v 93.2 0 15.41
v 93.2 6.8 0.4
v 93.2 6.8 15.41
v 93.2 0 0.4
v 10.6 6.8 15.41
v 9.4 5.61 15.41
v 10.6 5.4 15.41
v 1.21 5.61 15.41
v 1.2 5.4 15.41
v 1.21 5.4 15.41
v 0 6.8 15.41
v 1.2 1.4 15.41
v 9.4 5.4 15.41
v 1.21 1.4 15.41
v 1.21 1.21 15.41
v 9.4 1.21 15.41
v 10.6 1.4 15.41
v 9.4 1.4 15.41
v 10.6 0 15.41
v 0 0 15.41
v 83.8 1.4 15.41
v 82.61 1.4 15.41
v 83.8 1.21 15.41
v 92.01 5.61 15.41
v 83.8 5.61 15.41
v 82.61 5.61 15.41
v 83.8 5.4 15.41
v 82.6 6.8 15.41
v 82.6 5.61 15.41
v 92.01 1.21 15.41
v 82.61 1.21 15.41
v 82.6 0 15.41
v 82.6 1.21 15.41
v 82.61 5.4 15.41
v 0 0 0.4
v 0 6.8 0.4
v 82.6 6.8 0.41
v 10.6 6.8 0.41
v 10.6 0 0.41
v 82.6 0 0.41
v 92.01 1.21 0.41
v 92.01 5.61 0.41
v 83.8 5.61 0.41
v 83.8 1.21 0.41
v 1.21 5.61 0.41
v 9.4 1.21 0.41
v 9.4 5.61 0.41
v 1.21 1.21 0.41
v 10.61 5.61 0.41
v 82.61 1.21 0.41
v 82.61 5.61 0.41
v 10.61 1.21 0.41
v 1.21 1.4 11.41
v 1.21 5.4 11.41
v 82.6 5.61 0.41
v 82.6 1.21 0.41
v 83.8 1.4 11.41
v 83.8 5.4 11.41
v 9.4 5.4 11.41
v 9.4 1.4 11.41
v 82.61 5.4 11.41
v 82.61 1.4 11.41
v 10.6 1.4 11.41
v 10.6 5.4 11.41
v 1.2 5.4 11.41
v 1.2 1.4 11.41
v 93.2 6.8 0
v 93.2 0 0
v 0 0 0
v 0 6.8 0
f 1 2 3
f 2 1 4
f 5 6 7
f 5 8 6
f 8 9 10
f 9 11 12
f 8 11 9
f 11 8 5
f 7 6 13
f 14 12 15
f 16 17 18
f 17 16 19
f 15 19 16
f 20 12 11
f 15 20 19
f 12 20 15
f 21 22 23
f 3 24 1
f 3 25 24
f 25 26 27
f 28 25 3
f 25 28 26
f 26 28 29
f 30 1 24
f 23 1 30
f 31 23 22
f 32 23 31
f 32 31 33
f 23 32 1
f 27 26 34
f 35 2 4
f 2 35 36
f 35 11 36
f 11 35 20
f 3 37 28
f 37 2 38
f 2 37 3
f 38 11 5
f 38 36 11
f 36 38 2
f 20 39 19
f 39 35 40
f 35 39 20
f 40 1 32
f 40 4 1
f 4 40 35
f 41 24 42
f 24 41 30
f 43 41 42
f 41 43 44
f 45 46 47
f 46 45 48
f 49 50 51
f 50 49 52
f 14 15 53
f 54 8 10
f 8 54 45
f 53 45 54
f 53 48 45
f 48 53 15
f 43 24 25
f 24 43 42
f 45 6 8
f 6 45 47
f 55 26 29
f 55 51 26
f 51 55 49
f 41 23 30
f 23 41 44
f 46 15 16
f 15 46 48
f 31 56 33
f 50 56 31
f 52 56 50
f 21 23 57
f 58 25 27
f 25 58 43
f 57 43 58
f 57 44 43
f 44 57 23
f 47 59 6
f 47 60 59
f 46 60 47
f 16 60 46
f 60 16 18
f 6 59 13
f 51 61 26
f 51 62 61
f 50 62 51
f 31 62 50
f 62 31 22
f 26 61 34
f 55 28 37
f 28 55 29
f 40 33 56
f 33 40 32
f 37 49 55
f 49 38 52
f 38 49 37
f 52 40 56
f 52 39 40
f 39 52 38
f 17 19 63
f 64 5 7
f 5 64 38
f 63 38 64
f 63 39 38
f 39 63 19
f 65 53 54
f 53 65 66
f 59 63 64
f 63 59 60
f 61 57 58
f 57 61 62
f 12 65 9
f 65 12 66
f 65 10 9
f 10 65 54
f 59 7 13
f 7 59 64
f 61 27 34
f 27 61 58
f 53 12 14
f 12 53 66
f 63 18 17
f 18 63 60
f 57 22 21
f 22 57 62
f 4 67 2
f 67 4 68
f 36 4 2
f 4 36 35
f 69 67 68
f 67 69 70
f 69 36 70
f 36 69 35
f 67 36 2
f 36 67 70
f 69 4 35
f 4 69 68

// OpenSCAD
// file: ../../Base/Rotation.scad
// Fischertechnik Box Foundation
// Geometry Helpers Rotation

include <PlacementOptions.scad>

// getRotatedSpace(space, rotation=NoRotation)
// Rotates the space dependent on the specified rotation

function getRotatedSpace(space, rotation=NoRotation) = [
    (rotation == Rotate90 || rotation == Rotate270) ? space.y : space.x,
    (rotation == Rotate90 || rotation == Rotate270) ? space.x : space.y
];

// Rotates the given space around the fixed left lower corner
// space = the space the children needs as width/depth list [width,depth]
// rotation = 0 Rotate0 degrees, 1 Rotate90 degrees, 2 Rotate180 degrees, 3 Rotate270 degrees (equivalent to -90)

module RotateFix(space, rotation=NoRotation) {
    dy = (rotation == Rotate0 || rotation == Rotate270) ? 0 :
        (rotation == Rotate90) ? space.x :
        space.y;
    dx = (rotation < Rotate180) ? 0 :
        (rotation == Rotate180) ? space.x :
        space.y;
    
    translate([dx, dy, 0])
        rotate([0, 0, rotations[rotation]])
            children();
}
// file: ../../Base/Alignment.scad
// Fischertechnik Box Foundation
// Geometry Helpers Alignment

include <PlacementOptions.scad>

// getAlignedX(elementWidth, spaceWidth, align=AlignRight, offset=0)
// Gets the aligned X offset of an element with the given
// width in the given space.
// elementWidth = The width of the element to positon
// spaceWidth = The space where the element should be aligned
// align = 0 AlignLeft, 1 AlignCenter, 2 AlignRight
// offset = an optional offset from the aligned position. When
// aligned left or centered, then positive values are in X direction.
// When aligned right then positive values are in negative X direction.

function getAlignedX(elementWidth, spaceWidth, align=AlignRight, offset=0) =
    (align == AlignLeft) ?
        offset :
        ((align == AlignCenter) ?
        (spaceWidth - elementWidth)/2 + offset :
        spaceWidth - offset - elementWidth);

// getAlignedY(elementDepth, spaceDepth, align=AlignTop, offset=0)
// Gets the aligned Y offset of an element with the given
// depth in the given space.
// elementDepth = The depth of the element to positon
// spaceDepth = The space where the element should be aligned
// align = 0 AlignBottom, 1 AlignCenter, 2 AlignTop
// offset = an optional offset from the aligned position. When
// aligned bottom or centered, then positive values are in Y direction.
// When aligned top then positive values are in negative Y direction.

function getAlignedY(elementDepth, spaceDepth, align=AlignTop, offset=0) =
    (align == AlignBottom) ?
        offset :
        ((align == AlignCenter) ?
        (spaceDepth - elementDepth)/2 + offset :
        spaceDepth - offset - elementDepth);
// file: ../../Base/Boxes.scad
// Fischertechnik Box Foundation
// Pre-designed Boxes

use <Constants.scad>

include <PlacementOptions.scad>

box190Width = 190;
box190Depth = 130;
box130Width = 130;
box130Depth = 95;

// Values are from an original ec3 box
topBottomDifference = 1.5;
outerHeight = 40;
innerHeight = 38.2;
baseThickness = outerHeight - innerHeight;
stackExcess = 5.7;
radius = 3.5;
wallThickness = 1.5;
tolerance = 0.2;
stackOffset = innerHeight - stackExcess;

boxUsageHeight = stackOffset;
boxWallThickness = wallThickness;
boxBaseThickness = baseThickness;
boxWebWidth = 3.0;

// getBoxWallThickness()
// Gets the wall thickness of a Fischertechnik Box
function getBoxWallThickness() = boxWallThickness;

// getBoxUsageHeight()
// Gets the usable height of a Fischertechnik box
function getBoxUsageHeight() = boxUsageHeight;

// getBoxInnerHeight()
// Gets the inner height of a Fischertechnik box, including the stack excess
function getBoxInnerHeight() = innerHeight;

// getBoxBaseThickness()
// Gets the thickness of the Fischertechnik box base.
function getBoxBaseThickness() = boxBaseThickness;

// getBoxWebWidth()
// Gets the width of a box web
function getBoxWebWidth() = boxWebWidth;

// getBox190Space()
// Gets the usable inner space of a Box 190 as an x/y-list
function getBox190Space() = [
    box190Width - 2*getBoxWallThickness() - topBottomDifference, 
    box190Depth - 2*getBoxWallThickness() - topBottomDifference ];

// BoxBase(width, depth)
// Creates an empty stackable Fischertechnik compatible box
// width = Outer width of the box (190, 130, ...)
// depth = Outer depth of the box (130, 95, ...)

module BoxBase(width, depth, height=outerHeight) {    
    thinPlate = 0.01;

    innerHeight = height - baseThickness;    
    
    module BodyPlate(width, depth) {
        translate([radius, radius])
        hull() {
            w = width-2*radius;
            d = depth-2*radius;
            cube([w, d, thinPlate]);
            cylinder(thinPlate, r=radius, $fn=getFragments());
            translate([w, 0])
                cylinder(thinPlate, r=radius, $fn=getFragments());
            translate([w, d])
                cylinder(thinPlate, r=radius, $fn=getFragments());
            translate([0, d])
                cylinder(thinPlate, r=radius, $fn=getFragments());
        }
    }
    
    module Body(tolerance=tolerance) {
        hull() {
            // Bottom with tolerance to fit into the original boxes when stacked
            translate([-wallThickness+tolerance, -wallThickness+tolerance, -baseThickness])
                BodyPlate(width-topBottomDifference-2*tolerance, depth-topBottomDifference-2*tolerance);
            
            // Top
            translate([-wallThickness-topBottomDifference/2, -wallThickness-topBottomDifference/2, innerHeight-thinPlate])
                BodyPlate(width, depth);
         }
    }

    module Cutoff() {
        hull() {
            coWidth = width - 2*wallThickness;
            coDepth = depth - 2*wallThickness;
            
            // Bottom
            BodyPlate(coWidth-topBottomDifference, coDepth-topBottomDifference);

            // Top
            translate([-topBottomDifference/2, -topBottomDifference/2, innerHeight+thinPlate]) 
                BodyPlate(coWidth, coDepth);
        }
    }
    
    difference() {        
        Body();
        Cutoff();
        stackOffset = innerHeight - stackExcess;
        translate([0, 0, stackOffset + baseThickness])
            Body(tolerance=0);
    }
}

// Creates the Fischertechnik empty box 130x190 mm and places it at position 0,0
// 190x130 are the outer sizes, the inner space is slightly smaller. Use getBox190Space() to get the inner sizes.
// The box is positioned that the usable inner space is at the 0,0,0 position. The

module Box190() {
    BoxBase(box190Width, box190Depth);
}

// Gets the usable inner space of a Box 130 as an x/y-list
function getBox130Space() = [
    box130Width - 2*getBoxWallThickness() - topBottomDifference, 
    box130Depth - 2*getBoxWallThickness() - topBottomDifference ];

// Creates the Fischertechnik empty box 95x130 mm and places it at position 0,0
// 190x130 are the outer sizes, the inner space is slightly smaller. Use getBox190Space() to get the inner sizes.
// The box is positioned that the usable inner space is at the 0,0,0 position. The

module Box130() {
    BoxBase(box130Width, box130Depth);
}

// Creates a web at the specified box walls
// corner 0 = LowerLeft, 1 = UpperLeft, 2 = UpperRight, 3 = LowerRight
// side 0 = LeftOfCorner, 1 = RightOfCorner
// distance = Distance in mm from the corner
// boxSpace = inner width and depth of the box (default: Box 190)
// webWidth = length of the web (default is 3 mms)
// webThickness = thickness of the web (default is 1 mm)

module BoxWeb(corner, side, distance, boxSpace=getBox190Space(), webWidth=getBoxWebWidth(), webThickness=1.0) {
    sink = getBoxWallThickness()/2;

    width = (corner % 2 == 0) ? 
            (side == LeftOfCorner ? webWidth : webThickness) :
            (side == LeftOfCorner ? webThickness : webWidth);

    depth = (corner % 2 == 0) ? 
            (side == RightOfCorner ? webWidth : webThickness) :
            (side == RightOfCorner ? webThickness : webWidth);
    
    xDiff = corner == LowerLeft ? 
                (side == LeftOfCorner ? -sink : distance) :
            (corner == UpperLeft ?                
                (side == LeftOfCorner ? distance : -sink) :
            (corner == UpperRight ?
                (side == LeftOfCorner ? boxSpace.x-webWidth+sink : boxSpace.x-distance-webThickness) :
                (side == LeftOfCorner ? boxSpace.x-distance-webThickness: boxSpace.x-webWidth+sink)));

    yDiff = corner == LowerLeft ? 
                (side == RightOfCorner ? -sink : distance) :
            (corner == UpperLeft ?
                (side == RightOfCorner ? boxSpace.y-distance : boxSpace.y-webWidth+sink) :
            (corner == UpperRight ?
                (side == RightOfCorner ? boxSpace.y-webWidth+sink : boxSpace.y-distance) :
                (side == RightOfCorner ? distance : -sink)));
    
    translate([xDiff, yDiff, -getExcess()])
        cube([width, depth, boxUsageHeight + 2*getExcess()]);
}
// file: ../../Base/PlacementOptions.scad
// Fischertechnik Box Foundation
// Placement Options

// Alignment
NoAlign = 0;
AlignLeft = 1;
AlignBottom = 2;
AlignCenter = 3;
AlignRight = 4;
AlignTop = 5;

// Element rotation degree steps
rotations = [0, -90, -180, -270];

// Rotation
NoRotation = 0;
Rotate0 = 0;
Rotate90 = 1;
Rotate180 = 2;
Rotate270 = 3;

// Docking (seen from above)
NoDock = -1;
DockLeft = 0;
DockTop = 1;
DockRight = 2;
DockCorner = 2;
DockBottom = 3;

// Web corners
LowerLeft = 0;
UpperLeft = 1;
UpperRight = 2;
LowerRight = 3;

// Web position relative to corner
LeftOfCorner = 0;
RightOfCorner = 1;
// file: ../../Base/Placement.scad
// Fischertechnik Box Foundation
// Geometry Helpers Placement

use <Constants.scad>
use <Alignment.scad>
use <Rotation.scad>
use <Boxes.scad>

include <PlacementOptions.scad>

// Place(x=0, y=0, elementSpace=[0,0], alignX=AlignLeft, alignY=AlignBottom, rotation=Rotate0, boxSpace=getBox190Space())
// Places the child at the specified position
// y = Y-Position. This is a relative position when an X aligment is specified.
// x = X-Position. This is a relative position when an Y aligment is specified.
// elementSpace = space of the element to be placed [x,y]
// alignX = -1=NoAlign, 0 AlignLeft, 1 AlignCenter, 3 AlignRight (elementSpace and boxSpace required!)
// alignY = -1=NoAlign, 2 AlignBottom, 1 AlignCenter, 4 AlignTop (elementSpace and boxSpace required!)
// rotation = 0 Rotate0 0 degrees, 1 Rotate90 90 degrees, 
// 2 Rotate180 180 degrees, 3 Rotate270 270 degrees (equivalent to -90)
// boxSpace = Inner space of the box where the placement occurs [x,y] - default is Box 190x130 inner space

module Place(x=0, y=0, elementSpace=[0,0], 
  alignX=AlignLeft, alignY=AlignBottom, 
  rotation=NoRotation, boxSpace=getBox190Space()) {

    module Position(x, y, space, rotation=Rotate0) {
        translate([x, y, 0])
            RotateFix(space, rotation)
                children();
    }

    space = getRotatedSpace(elementSpace, rotation);
    alignedX = getAlignedX(space.x, boxSpace.x, alignX, x);
    alignedY = getAlignedY(space.y, boxSpace.y, alignY, y);
    Position(alignedX, alignedY, elementSpace, rotation)
        children();
}

// Center(space=getBox130Space(), elementSpace=[0,0])
// space = Space where the children is centered. For cylinder use centered=true and no elementSpace.
// elementSpace = space of the element to be centered [x,y]

module Center(space=getBox190Space(), elementSpace=[0,0]) {
    Place(elementSpace=elementSpace, boxSpace=space, alignX=AlignCenter, alignY=AlignCenter)
        children();
}

// CenterHorizontal(width=0, y=0, offset=0, space=getBox130Space())
// width = Width of the element to be placed.
// y = Y position of the element
// offset = Offset from the center position (negative will be left of the center)
// space = Space where the element is placed

module CenterHorizontal(width=0, y=0, offset=0, space=getBox190Space()) {
    Place(x=offset, y=y, elementSpace=[width, 0], boxSpace=space, alignX=AlignCenter)
        children(0);
}

// CenterVertical(depth=0, x=0, offset=0, space=getBox130Space())
// depth = Depth of the element to be placed.
// x = X position of the element
// offset = Offset from the center position (negative will be down of the center)
// space = Space where the element is placed

module CenterVertical(depth=0, x=0, offset=0, space=getBox190Space()) {
    Place(x=x, y=offset, elementSpace=[0, depth], boxSpace=space, alignY=AlignCenter)
        children(0);
}

// getIsVertical(align)
// True if the specified alignment needs a vertical orientation for a divider (AlignRight, AlignLeft)

function getIsVertical(align) = (align == AlignRight || align == AlignLeft);

// getIsHorizontal(align)
// True if the specified alignment needs a horizontal orientation for a divider (AlignTop, AlignBottom)

function getIsHorizontal(align) = (align == AlignTop || align == AlignBottom);
// file: ../../Elements/AxisClip10.scad
// Fischertechnik Box Library
// Axis for clip 10
// 31023

use <../ModelBase/Simple.scad>
use <../Base/Constants.scad>

/* [Element Parameters] */
height = 23;
clipHeight = 10;

/* [Hidden] */
width = 12;
depth = 12;
upperDiameter = 3.6;

// getAxisClip10Space()
// Gets the space of a n axis for a clip 10 with spring ring (mot2)

function getAxisClip10Space() = [width, depth, height];

// AxisClip10(height, clipHeight)
// Axis for clip 10 with spring ring (mot2)
// height = Height of the complete axis (standard is 23, in mot3 its only 12)
// clipHeight = Height of the part for the clip (standard is 10, in mot3 its only 7)

module AxisClip10(height=height, clipHeight=clipHeight) {
    LeveledAxisWithSpace(height, height-clipHeight, getAxisClip10Space(), diameter=upperDiameter);
}

// Test
color("lightgray")
AxisClip10(height, clipHeight);
// file: ../../Base/Constants.scad
// Fischertechnik Box Foundation
// Constants

// Constant values necessary for multiple elements

// Base constants
dividerThickness = 1.2;
excess = 0.01;
fragments = 90;
tolerance = 0.8;

// Gets the thickness of a divider 
function getDividerThickness() = dividerThickness;

// Gets the excess that is used to merge walls into each other
function getExcess() = excess;

// Gets amount of fragments of a cylinder
function getFragments() = fragments;

// Gets the inner tolerance of a frame to each side
function getTolerance() = tolerance;


// Fischertechnik specific constants
axisDiameter = 4;
axisBottomDiameter = axisDiameter + 1;
axisTolerance = 0.2;

// Gets axis diameter of Fischertechnik axis
function getAxisDiameter() = axisDiameter;

// Gets axis diameter tolerance (subtracted for element axis)
function getAxisTolerance() = axisTolerance;

// Gets the axis diameter for standing axis
function getStandAxisDiameter() = getAxisDiameter() - getAxisTolerance();

// Gets axis bottom diameter for thicker part at the bottom
function getAxisBottomDiameter() = axisBottomDiameter;

standardEdgeDistance = 2.5;
standardWebDistance = 11.5;
standardCornerLength = 15;

// gets the standard distance to the wall of the box for dockable frames with webs
function getStandardEdgeDistance() = standardEdgeDistance;

// gets the standard distance of each web to the corner of the dockable frame
function getStandardWebDistance() = standardWebDistance;

// gets the standard length of the corner walls of a dockable frame
function getStandardCornerLength() = standardCornerLength;

tubeWallFactor = 0.8;

// gets the wall thickness of a tube.
function getTubeWallThickness() = tubeWallFactor * getDividerThickness();

smallPartsFrameHeight = 20;

// gets the frame height for docked small parts boxes.
function getSmallPartsFrameHeight() = smallPartsFrameHeight;

hubRingDiameter = 19.5;
hubRingLevelDiameter = 21;

// gets the diameter of a tube matching the inner ring of a wheel
function getHubRingDiameter() = hubRingDiameter;

// gets the diameter of a hub tube with a thicker diameter
function getHubRingLevelDiameter() = hubRingLevelDiameter;
// file: ../../Elements/FrameAxis90.scad
// Fischertechnik Box Library
// Frame for single 90 mm Axis
// 31040

use <../ModelBase/Complex.scad>

length = 90;

// getFrameAxis90Space()
// Gets the width (.x) and depth (.y) of the axis frame.

function getFrameAxis90Space() = getFrameAxisSpace(length);

// FrameAxis90()
// Axis holder for a single 90 mm axis.

module FrameAxis90() {
    FrameAxis(length);
}

// Test
color("lightgray")
FrameAxis90();
// file: ../TestPrint.scad
// 3D Print Test Base

use <../Base/Constants.scad>

use <../Elements/AxisClip10.scad>

module TestPrint(elementSpace) {
    cube([elementSpace.x, elementSpace.y, 0.4]);
    translate([0,0,0.4+getExcess()]) {
        children();
    }
}

TestPrint(getAxisClip10Space())
    AxisClip10();
// main file
// 3D Print Test
// FrameAxis90

use <../TestPrint.scad>
use <../../Elements/FrameAxis90.scad>

TestPrint(getFrameAxis90Space())
    FrameAxis90();
